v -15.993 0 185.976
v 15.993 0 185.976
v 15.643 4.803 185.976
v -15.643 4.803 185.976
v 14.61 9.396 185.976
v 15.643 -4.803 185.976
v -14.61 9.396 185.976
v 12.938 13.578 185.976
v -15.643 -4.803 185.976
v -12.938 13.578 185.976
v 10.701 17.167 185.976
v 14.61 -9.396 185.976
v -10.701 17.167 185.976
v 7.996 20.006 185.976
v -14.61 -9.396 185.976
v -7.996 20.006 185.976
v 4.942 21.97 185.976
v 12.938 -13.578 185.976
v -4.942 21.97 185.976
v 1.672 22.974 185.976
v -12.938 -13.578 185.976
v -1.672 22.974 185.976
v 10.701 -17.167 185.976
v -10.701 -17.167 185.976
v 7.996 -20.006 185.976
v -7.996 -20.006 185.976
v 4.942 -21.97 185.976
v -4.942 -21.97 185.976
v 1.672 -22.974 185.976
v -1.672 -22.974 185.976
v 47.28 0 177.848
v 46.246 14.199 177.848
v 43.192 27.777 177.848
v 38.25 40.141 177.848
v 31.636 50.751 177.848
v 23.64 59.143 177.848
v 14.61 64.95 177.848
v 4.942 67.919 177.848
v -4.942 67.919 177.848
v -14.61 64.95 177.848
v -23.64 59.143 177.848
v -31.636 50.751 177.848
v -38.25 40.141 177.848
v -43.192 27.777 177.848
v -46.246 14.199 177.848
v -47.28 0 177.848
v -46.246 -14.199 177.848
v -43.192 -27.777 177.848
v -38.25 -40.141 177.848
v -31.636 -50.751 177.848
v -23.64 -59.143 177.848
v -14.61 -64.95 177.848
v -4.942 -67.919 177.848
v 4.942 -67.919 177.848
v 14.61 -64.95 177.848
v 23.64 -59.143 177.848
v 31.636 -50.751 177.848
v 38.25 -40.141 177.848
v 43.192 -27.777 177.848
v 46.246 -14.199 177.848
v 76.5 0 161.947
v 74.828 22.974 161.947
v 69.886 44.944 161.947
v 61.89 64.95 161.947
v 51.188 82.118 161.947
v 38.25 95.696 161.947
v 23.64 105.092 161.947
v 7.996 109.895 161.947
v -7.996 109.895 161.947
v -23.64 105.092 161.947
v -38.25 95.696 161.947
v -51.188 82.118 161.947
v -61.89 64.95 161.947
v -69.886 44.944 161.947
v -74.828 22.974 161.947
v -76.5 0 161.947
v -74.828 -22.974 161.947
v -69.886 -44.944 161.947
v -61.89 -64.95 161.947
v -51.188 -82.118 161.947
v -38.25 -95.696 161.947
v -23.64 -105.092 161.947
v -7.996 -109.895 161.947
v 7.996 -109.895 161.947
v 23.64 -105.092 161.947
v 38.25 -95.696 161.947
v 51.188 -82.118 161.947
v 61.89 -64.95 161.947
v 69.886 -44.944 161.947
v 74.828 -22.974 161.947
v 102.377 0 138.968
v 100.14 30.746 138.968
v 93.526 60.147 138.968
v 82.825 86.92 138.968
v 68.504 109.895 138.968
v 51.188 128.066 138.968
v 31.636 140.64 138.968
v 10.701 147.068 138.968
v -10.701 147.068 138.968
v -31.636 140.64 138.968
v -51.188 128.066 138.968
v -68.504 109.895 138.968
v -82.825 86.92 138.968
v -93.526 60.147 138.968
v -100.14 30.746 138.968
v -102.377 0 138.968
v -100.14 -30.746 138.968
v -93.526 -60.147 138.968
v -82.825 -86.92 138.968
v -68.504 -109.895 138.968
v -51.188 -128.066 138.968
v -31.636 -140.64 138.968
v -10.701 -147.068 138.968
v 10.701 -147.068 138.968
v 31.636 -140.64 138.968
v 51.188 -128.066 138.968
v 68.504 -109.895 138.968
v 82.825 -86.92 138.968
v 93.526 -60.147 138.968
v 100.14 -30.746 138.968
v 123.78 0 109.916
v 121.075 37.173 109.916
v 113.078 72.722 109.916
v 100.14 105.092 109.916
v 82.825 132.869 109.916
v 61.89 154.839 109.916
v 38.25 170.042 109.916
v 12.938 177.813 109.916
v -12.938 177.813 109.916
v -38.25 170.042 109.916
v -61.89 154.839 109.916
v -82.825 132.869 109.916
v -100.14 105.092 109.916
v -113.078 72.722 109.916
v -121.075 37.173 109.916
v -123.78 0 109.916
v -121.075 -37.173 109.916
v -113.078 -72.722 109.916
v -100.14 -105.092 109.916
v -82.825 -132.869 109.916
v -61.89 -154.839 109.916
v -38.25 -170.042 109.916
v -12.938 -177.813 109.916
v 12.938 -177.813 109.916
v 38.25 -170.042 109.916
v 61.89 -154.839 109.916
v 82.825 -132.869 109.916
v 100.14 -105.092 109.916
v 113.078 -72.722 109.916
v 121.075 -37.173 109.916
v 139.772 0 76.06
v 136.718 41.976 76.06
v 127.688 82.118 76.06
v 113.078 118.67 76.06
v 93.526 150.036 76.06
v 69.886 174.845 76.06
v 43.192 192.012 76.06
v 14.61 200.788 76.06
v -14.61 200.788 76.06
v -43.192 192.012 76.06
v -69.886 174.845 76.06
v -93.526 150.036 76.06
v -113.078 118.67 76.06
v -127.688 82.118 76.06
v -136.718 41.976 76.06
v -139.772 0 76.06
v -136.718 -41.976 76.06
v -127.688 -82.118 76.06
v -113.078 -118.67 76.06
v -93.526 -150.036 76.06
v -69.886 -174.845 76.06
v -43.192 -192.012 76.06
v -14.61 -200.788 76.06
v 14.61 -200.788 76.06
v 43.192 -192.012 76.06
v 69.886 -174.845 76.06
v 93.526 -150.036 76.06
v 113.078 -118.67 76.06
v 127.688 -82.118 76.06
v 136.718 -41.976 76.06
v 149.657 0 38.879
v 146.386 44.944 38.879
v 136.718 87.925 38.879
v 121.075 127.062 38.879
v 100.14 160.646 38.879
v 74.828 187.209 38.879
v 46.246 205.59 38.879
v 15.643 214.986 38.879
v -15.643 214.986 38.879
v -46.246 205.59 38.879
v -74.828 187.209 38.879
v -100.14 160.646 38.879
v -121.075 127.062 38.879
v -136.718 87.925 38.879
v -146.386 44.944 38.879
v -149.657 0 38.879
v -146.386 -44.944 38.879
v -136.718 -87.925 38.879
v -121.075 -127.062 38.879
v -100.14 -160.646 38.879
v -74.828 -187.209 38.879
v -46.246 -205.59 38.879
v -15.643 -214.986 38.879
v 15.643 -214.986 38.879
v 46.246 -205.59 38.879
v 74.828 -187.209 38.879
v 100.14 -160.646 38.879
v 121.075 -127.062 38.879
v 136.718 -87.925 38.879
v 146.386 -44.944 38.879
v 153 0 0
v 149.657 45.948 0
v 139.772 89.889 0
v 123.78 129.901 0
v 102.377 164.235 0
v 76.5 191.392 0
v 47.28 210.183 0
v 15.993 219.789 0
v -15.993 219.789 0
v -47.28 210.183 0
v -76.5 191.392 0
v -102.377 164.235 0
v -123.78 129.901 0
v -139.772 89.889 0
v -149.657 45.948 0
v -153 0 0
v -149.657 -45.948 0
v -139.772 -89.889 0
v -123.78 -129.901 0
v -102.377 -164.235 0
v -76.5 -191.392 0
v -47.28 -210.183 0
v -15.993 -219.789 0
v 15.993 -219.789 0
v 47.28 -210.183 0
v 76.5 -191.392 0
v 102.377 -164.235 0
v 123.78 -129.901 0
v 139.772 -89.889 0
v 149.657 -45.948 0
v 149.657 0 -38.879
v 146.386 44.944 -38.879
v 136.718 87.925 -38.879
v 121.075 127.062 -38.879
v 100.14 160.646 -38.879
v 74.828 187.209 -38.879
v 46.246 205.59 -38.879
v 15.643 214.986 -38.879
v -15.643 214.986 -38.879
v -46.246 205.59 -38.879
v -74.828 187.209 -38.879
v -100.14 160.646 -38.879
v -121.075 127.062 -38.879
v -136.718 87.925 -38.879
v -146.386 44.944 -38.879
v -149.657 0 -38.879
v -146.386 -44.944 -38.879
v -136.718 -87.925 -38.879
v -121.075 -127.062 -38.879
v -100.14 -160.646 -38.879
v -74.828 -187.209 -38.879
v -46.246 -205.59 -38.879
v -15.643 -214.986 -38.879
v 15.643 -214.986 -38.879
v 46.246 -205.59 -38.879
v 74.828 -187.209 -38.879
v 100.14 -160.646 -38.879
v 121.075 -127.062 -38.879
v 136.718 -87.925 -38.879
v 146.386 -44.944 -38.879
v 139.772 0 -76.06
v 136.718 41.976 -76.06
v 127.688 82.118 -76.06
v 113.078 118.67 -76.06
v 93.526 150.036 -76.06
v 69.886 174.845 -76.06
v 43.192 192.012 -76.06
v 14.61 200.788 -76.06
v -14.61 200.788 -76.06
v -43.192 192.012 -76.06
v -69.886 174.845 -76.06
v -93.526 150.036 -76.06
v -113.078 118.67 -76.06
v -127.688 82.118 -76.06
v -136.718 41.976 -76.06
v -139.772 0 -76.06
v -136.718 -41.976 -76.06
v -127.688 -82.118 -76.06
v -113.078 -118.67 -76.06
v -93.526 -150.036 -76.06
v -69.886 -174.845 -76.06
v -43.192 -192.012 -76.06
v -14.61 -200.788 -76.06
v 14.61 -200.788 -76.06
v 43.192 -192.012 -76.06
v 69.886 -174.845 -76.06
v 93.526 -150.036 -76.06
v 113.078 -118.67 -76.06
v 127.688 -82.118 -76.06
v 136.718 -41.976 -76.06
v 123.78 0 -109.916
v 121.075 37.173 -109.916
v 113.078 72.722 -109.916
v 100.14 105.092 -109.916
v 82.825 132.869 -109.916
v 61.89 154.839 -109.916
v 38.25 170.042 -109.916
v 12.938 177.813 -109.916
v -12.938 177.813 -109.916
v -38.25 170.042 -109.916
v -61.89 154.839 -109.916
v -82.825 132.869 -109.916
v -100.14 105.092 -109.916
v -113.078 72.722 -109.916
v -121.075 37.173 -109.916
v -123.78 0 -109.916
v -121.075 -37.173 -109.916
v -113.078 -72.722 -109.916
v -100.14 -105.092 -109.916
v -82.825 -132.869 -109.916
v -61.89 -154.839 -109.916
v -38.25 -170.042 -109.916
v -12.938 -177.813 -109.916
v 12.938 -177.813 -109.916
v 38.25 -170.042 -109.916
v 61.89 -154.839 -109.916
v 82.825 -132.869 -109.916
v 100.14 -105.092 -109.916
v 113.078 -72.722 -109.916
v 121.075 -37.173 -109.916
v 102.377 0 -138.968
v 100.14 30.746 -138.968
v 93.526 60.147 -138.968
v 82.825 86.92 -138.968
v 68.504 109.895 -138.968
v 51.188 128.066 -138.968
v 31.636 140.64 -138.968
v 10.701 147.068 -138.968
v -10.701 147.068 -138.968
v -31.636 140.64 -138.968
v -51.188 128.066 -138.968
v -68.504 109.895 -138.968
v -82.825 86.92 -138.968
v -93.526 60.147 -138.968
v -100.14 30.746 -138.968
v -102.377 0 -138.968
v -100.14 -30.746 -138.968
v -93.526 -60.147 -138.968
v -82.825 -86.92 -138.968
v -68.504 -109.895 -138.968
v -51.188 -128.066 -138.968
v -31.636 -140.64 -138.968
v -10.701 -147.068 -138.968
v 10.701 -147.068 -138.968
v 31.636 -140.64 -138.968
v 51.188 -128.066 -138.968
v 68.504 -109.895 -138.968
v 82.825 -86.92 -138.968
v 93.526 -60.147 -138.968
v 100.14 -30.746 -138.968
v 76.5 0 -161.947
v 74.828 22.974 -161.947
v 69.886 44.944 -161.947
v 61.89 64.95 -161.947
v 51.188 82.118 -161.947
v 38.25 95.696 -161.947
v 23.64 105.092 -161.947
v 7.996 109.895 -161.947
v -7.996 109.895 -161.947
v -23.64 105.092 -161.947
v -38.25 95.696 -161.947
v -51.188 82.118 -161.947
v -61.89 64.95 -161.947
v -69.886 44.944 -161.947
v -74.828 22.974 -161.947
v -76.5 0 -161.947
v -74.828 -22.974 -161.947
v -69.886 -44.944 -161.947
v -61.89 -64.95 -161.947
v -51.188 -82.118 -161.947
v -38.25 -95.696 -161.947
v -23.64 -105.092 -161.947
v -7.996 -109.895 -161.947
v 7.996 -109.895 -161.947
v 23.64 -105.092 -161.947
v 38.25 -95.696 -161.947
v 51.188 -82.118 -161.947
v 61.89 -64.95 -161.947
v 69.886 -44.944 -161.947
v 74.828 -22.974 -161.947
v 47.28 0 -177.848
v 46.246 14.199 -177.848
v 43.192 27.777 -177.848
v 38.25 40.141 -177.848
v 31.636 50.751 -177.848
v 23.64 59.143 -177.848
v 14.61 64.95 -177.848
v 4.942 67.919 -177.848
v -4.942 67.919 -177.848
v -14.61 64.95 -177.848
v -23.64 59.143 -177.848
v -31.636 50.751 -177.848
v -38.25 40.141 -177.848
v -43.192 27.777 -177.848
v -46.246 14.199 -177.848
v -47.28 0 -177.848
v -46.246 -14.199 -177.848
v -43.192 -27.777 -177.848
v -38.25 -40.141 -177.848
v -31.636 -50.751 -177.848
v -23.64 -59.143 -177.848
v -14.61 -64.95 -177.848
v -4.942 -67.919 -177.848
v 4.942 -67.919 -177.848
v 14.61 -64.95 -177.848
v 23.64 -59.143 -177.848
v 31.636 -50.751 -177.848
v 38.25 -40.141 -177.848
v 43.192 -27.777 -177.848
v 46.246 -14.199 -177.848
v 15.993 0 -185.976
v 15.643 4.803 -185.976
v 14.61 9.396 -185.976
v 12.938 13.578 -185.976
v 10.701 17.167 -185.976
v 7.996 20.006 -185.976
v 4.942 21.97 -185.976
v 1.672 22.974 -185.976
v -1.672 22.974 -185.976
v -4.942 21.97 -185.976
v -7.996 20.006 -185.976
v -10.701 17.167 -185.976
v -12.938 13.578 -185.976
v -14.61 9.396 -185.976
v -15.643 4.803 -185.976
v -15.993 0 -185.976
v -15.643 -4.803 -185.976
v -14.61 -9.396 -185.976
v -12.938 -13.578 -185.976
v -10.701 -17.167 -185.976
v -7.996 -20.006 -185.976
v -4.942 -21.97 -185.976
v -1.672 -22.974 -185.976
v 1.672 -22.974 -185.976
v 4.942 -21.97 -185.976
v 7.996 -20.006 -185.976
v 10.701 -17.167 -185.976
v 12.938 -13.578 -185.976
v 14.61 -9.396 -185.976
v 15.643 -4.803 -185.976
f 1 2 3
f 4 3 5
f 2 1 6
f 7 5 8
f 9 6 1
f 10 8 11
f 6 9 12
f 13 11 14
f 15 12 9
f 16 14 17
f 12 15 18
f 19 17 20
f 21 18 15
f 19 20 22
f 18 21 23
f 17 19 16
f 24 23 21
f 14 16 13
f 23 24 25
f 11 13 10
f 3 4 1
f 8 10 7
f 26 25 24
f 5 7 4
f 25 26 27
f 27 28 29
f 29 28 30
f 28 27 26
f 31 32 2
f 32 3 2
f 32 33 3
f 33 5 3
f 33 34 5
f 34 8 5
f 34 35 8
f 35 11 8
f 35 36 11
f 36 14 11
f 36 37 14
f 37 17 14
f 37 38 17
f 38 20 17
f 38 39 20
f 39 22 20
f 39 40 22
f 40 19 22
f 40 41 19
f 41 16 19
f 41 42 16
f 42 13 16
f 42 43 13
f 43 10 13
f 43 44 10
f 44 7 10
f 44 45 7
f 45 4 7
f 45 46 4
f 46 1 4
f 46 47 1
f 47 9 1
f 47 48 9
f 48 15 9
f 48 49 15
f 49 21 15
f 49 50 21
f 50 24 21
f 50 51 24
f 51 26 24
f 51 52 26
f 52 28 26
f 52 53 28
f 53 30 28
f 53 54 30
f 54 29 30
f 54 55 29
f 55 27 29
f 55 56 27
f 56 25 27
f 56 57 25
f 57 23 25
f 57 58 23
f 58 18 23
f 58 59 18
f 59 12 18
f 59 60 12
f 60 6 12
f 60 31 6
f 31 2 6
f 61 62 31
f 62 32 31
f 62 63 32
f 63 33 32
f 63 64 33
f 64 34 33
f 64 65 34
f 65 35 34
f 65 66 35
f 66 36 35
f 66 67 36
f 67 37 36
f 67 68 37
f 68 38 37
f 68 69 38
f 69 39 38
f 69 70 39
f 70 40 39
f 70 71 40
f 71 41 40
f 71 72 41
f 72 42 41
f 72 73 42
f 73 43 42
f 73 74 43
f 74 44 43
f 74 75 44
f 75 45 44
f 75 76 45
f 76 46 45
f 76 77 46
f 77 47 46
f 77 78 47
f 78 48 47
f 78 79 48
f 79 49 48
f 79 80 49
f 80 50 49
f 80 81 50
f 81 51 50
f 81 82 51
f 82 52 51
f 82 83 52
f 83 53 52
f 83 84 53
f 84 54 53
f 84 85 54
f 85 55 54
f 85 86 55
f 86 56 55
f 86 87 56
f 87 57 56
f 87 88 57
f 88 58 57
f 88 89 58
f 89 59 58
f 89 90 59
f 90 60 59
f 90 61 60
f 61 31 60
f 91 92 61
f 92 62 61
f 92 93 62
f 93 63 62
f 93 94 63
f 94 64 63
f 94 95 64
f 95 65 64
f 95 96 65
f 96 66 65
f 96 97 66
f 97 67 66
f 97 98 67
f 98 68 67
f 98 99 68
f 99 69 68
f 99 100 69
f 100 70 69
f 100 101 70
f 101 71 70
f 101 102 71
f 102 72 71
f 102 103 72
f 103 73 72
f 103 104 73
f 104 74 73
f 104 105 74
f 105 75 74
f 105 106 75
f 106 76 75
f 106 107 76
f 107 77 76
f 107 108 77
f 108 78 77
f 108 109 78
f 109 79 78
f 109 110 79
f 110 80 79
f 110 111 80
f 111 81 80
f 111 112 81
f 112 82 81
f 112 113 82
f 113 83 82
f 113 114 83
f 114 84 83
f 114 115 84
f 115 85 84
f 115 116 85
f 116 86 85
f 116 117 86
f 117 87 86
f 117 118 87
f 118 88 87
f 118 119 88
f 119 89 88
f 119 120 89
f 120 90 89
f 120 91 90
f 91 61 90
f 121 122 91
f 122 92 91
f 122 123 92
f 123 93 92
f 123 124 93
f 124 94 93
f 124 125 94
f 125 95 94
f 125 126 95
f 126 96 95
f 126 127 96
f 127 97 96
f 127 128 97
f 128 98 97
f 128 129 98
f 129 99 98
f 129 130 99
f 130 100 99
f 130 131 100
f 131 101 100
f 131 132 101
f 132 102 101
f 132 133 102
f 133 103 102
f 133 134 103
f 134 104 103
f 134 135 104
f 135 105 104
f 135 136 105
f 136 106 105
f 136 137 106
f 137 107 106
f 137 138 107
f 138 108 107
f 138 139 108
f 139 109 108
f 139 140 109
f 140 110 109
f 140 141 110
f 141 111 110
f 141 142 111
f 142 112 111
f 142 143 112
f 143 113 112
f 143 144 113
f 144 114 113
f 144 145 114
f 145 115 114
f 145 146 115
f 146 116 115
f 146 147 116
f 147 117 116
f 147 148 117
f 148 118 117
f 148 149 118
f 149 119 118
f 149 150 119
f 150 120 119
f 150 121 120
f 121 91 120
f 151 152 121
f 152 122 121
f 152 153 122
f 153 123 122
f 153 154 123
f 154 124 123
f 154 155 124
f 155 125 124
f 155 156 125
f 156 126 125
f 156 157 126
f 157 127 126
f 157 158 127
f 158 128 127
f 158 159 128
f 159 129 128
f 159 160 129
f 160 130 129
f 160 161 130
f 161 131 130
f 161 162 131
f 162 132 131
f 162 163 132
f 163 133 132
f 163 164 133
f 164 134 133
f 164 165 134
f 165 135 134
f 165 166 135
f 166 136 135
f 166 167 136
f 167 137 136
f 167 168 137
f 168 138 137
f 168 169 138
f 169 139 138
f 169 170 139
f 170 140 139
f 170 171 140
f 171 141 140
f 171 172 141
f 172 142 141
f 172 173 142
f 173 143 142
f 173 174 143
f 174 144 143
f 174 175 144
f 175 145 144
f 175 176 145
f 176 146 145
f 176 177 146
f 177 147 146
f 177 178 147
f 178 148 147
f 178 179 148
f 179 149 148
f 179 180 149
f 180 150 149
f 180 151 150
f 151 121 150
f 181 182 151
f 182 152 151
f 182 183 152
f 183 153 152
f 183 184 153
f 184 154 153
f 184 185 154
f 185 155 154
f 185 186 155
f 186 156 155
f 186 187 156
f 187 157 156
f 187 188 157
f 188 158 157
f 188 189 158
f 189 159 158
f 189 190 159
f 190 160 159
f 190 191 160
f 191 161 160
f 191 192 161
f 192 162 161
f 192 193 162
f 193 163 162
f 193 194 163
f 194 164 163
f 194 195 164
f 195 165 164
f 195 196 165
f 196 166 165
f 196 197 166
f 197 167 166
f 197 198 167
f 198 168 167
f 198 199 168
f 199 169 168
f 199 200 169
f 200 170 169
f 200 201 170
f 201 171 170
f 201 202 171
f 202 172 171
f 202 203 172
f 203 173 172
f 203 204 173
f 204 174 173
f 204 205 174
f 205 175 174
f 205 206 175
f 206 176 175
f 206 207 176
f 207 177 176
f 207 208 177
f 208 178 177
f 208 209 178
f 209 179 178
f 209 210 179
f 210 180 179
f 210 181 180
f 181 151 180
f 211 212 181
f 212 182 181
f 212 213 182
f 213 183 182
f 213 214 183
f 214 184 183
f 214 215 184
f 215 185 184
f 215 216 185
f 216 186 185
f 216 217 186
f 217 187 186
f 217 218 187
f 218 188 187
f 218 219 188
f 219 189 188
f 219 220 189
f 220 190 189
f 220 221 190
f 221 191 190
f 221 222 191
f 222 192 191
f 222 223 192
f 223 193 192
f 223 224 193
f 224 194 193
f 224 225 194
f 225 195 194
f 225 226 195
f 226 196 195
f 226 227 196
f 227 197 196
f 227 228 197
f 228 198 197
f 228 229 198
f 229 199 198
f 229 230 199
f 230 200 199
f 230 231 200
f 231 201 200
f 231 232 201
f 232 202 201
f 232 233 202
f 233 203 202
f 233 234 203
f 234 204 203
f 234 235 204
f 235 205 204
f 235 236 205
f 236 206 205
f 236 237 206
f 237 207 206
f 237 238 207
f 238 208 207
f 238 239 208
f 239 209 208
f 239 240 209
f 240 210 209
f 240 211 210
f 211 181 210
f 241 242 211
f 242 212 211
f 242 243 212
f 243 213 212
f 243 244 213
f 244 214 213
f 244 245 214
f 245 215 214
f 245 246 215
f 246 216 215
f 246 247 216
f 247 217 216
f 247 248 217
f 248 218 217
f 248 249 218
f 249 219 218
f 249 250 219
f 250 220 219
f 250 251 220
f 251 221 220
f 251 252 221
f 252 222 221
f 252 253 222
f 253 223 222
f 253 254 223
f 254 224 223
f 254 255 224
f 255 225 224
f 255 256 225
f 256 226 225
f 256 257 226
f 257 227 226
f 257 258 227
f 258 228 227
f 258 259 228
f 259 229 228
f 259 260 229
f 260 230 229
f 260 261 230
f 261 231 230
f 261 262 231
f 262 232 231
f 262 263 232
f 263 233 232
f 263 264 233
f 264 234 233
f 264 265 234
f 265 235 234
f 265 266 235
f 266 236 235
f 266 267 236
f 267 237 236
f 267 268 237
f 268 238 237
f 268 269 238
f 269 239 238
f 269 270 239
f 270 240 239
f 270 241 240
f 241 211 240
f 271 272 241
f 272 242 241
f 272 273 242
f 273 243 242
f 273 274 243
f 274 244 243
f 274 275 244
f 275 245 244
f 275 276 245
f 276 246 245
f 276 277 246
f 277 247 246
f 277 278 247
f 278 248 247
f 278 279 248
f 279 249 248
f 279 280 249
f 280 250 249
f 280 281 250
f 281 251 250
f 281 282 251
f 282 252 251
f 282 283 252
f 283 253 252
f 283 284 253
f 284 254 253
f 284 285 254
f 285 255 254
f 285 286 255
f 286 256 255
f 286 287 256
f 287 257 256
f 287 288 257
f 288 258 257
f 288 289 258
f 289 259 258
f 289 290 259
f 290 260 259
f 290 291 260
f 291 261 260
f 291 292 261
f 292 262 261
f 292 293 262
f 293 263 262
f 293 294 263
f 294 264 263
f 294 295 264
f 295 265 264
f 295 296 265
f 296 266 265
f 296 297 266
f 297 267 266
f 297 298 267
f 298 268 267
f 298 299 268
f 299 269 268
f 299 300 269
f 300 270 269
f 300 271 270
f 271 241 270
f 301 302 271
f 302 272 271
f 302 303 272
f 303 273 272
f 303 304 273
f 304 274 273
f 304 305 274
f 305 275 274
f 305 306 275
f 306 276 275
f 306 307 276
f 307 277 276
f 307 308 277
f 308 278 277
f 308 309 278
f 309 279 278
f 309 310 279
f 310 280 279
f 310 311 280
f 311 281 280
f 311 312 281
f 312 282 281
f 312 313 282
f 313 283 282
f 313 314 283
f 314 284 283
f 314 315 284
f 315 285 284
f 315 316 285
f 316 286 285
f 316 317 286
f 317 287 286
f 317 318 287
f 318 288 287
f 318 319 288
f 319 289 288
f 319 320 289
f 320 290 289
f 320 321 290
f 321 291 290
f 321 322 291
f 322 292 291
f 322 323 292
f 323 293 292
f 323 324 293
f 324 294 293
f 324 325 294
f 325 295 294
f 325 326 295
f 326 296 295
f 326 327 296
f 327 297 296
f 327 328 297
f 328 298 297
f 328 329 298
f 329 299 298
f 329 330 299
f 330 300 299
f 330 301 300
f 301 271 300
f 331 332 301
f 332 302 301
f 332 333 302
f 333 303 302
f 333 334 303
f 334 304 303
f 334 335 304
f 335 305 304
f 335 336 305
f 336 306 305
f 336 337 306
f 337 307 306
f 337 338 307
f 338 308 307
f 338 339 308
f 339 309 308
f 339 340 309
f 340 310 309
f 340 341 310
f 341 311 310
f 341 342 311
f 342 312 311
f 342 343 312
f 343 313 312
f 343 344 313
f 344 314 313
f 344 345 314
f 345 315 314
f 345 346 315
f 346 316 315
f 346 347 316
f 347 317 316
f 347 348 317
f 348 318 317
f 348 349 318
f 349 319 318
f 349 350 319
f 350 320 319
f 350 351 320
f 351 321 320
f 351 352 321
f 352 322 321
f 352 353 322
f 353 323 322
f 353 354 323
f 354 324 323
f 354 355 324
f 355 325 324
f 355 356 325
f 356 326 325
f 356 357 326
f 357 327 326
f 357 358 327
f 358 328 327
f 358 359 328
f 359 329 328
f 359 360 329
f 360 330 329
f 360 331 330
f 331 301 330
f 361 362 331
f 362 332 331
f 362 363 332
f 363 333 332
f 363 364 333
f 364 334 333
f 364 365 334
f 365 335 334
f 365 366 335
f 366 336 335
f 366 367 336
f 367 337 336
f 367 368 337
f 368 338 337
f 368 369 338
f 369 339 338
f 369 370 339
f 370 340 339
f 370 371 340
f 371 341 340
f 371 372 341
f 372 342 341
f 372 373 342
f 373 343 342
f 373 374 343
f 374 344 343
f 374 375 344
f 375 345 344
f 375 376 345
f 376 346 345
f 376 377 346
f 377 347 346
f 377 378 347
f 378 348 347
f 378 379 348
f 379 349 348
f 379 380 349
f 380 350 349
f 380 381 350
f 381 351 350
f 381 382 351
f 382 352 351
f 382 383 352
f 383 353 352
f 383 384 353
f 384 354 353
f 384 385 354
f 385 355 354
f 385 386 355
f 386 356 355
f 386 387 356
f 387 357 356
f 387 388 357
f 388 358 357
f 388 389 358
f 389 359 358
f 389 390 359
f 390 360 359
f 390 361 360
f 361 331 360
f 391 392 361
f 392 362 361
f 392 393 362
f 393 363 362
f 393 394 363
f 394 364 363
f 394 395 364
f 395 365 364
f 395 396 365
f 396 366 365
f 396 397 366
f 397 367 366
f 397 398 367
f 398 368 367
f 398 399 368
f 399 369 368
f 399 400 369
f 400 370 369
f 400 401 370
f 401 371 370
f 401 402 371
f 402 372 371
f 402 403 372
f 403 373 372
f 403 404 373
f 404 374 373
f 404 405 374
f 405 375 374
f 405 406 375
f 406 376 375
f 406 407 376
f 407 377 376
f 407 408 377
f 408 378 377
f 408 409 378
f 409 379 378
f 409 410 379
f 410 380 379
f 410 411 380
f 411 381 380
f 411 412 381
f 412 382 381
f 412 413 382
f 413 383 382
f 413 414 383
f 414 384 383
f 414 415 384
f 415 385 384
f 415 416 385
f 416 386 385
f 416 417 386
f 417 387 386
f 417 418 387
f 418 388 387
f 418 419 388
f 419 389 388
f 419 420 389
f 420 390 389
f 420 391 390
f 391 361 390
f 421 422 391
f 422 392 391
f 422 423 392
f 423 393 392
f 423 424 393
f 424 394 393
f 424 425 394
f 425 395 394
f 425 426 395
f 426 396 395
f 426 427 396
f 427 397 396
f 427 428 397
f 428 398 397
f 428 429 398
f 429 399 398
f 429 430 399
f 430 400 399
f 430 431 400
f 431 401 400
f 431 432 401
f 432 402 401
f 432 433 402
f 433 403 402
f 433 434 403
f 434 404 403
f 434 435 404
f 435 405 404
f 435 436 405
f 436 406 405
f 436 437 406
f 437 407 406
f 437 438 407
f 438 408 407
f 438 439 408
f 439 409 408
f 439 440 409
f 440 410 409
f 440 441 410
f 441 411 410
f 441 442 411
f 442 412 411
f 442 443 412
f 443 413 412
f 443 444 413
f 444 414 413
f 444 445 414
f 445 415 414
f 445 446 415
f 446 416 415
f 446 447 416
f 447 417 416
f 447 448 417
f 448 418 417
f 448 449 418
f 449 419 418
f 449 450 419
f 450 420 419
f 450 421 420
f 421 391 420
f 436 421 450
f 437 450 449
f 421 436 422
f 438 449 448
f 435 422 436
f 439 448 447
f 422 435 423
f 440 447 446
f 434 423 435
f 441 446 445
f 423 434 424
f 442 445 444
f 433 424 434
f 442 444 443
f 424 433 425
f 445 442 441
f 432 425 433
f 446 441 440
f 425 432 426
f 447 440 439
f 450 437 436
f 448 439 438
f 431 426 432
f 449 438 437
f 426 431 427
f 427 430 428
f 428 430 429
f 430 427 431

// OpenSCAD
// Generated by SolidPython 1.0.1 on 2020-07-29 00:46:48


scale(v = [9, 13, 11]) {
	sphere(r = 17);
}
/***********************************************
*********      SolidPython code:      **********
************************************************
 
# import packages: SolidPython
from solid import *
from solid.utils import *
from itertools import chain, combinations, permutations


class Resize:

    def __init__(self, scad_file):
        self.scad_file = scad_file
        #self.scad_file = import_scad(scad_file)
        # cone/cylinder param:
        self.r1 = 0
        self.r2 = 0
        self.h = 0
        # rectangular prism param:
        self.w = 0
        self.l = 0
        # ellipse param:
        self.r = 0

    # import OpenScad code (file name corresponds to shape)


    # classify shape + parameters
    def assign(self, param1, param2, param3):
        if self.scad_file == 'cone.scad':
            self.r1 = param1
            self.r2 = param2
            self.h = param3
        elif self.scad_file == 'cylinder.scad':
            self.r1 = param1
            self.r2 = param2
            self.h = param3
        elif self.scad_file == 'rectangularPrism.scad':
            self.h = param1
            self.l = param2
            self.w = param3
        else:
            self.r = param1
            self.h = param2

    # resize parameters
    def iterate(self):
        x = range(3, 20, 2)
        i = 1
        if self.scad_file == 'cone.scad':
            tempList = list(permutations(x, 2))
            for temp in tempList:
                param1 = temp[0]
                param2 = temp[1]
                filepath = 'produced_scad_files/' + 'cone' + str(param1) + '_' + str(param2) + '_' + '.scad'
                scad_render_to_file(cylinder(h=param1, r1=param2, r2=0), filepath)

        elif self.scad_file == 'cylinder.scad':
            tempList = list(permutations(x, 3))
            for temp in tempList:
                param1 = temp[0]
                param2 = temp[1]
                filepath = 'produced_scad_files/' + 'cylinder' + str(param1) + '_' + str(param2) + '_' + '.scad'
                scad_render_to_file(cylinder(h=param1, r1=param2, r2=param2), filepath)

        elif self.scad_file == 'rectangularPrism.scad':
            tempList = list(permutations(x, 3))
            for temp in tempList:
                param1 = temp[0]
                param2 = temp[1]
                param3 = temp[2]
                filepath = 'produced_scad_files/' + 'rectangularPrism' + str(param1) + '_' + str(param2) + '_' + str(
                    param3) + '.scad'
                scad_render_to_file(cube(size=(param1, param2, param3)), filepath)

        elif self.scad_file == 'ellipse.scad':
            tempList = list(permutations(x, 4))
            for temp in tempList:
                param1 = temp[0]
                param2 = temp[1]
                param3 = temp[2]
                param4 = temp[3]
                filepath = 'produced_scad_files/' + 'ellipse' + str(param1) + '_' + str(param2) + '_' + str(param3) + '_' + str(param4) + '.scad'
                scad_render_to_file(scale([param1, param2, param3])(sphere(r=param4)), filepath)

    def render_to_scadfile(self):
        scad_render_to_file(scad, 'example.scad') 
 
************************************************/
